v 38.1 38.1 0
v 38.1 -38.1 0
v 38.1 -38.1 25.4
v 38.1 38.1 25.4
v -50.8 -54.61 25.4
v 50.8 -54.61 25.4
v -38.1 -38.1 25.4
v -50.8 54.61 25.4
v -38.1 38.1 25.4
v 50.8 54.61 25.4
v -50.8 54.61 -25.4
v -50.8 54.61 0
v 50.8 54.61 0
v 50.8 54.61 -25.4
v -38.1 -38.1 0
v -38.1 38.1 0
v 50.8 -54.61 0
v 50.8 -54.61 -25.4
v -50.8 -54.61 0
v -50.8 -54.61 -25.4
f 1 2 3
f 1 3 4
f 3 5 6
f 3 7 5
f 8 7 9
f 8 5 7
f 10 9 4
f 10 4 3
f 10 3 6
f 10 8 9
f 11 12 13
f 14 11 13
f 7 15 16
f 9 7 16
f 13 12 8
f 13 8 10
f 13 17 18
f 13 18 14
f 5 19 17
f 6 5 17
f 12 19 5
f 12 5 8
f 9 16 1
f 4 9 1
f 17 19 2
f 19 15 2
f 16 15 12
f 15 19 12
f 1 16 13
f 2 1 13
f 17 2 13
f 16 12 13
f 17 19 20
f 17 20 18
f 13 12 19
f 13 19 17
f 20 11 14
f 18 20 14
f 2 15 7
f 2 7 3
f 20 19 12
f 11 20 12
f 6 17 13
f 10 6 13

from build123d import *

# Parameters (mm, degrees)
F0_W     = 101.6
F0_H     = 109.22
F0_W_2   = 76.2
F0_H_2   = 76.2
F1_DEPTH = 25.4
F2_DEPTH = 25.4


with BuildPart() as f1:
    # F0 (on Top) → F1 (new body)
    with BuildSketch(Plane.XY):
        Rectangle(F0_W, F0_H)
        Rectangle(F0_W_2, F0_H_2, mode=Mode.SUBTRACT)
    extrude(amount=F1_DEPTH)


with BuildPart() as f2:
    # F0 (on Top) → F2 (new body)
    with BuildSketch(Plane.XY):
        Rectangle(F0_W, F0_H)
        Rectangle(F0_W_2, F0_H_2, mode=Mode.SUBTRACT)
        Rectangle(F0_W_2, F0_H_2)
    extrude(amount=-F2_DEPTH)


solid = Compound([f1.part, f2.part])
